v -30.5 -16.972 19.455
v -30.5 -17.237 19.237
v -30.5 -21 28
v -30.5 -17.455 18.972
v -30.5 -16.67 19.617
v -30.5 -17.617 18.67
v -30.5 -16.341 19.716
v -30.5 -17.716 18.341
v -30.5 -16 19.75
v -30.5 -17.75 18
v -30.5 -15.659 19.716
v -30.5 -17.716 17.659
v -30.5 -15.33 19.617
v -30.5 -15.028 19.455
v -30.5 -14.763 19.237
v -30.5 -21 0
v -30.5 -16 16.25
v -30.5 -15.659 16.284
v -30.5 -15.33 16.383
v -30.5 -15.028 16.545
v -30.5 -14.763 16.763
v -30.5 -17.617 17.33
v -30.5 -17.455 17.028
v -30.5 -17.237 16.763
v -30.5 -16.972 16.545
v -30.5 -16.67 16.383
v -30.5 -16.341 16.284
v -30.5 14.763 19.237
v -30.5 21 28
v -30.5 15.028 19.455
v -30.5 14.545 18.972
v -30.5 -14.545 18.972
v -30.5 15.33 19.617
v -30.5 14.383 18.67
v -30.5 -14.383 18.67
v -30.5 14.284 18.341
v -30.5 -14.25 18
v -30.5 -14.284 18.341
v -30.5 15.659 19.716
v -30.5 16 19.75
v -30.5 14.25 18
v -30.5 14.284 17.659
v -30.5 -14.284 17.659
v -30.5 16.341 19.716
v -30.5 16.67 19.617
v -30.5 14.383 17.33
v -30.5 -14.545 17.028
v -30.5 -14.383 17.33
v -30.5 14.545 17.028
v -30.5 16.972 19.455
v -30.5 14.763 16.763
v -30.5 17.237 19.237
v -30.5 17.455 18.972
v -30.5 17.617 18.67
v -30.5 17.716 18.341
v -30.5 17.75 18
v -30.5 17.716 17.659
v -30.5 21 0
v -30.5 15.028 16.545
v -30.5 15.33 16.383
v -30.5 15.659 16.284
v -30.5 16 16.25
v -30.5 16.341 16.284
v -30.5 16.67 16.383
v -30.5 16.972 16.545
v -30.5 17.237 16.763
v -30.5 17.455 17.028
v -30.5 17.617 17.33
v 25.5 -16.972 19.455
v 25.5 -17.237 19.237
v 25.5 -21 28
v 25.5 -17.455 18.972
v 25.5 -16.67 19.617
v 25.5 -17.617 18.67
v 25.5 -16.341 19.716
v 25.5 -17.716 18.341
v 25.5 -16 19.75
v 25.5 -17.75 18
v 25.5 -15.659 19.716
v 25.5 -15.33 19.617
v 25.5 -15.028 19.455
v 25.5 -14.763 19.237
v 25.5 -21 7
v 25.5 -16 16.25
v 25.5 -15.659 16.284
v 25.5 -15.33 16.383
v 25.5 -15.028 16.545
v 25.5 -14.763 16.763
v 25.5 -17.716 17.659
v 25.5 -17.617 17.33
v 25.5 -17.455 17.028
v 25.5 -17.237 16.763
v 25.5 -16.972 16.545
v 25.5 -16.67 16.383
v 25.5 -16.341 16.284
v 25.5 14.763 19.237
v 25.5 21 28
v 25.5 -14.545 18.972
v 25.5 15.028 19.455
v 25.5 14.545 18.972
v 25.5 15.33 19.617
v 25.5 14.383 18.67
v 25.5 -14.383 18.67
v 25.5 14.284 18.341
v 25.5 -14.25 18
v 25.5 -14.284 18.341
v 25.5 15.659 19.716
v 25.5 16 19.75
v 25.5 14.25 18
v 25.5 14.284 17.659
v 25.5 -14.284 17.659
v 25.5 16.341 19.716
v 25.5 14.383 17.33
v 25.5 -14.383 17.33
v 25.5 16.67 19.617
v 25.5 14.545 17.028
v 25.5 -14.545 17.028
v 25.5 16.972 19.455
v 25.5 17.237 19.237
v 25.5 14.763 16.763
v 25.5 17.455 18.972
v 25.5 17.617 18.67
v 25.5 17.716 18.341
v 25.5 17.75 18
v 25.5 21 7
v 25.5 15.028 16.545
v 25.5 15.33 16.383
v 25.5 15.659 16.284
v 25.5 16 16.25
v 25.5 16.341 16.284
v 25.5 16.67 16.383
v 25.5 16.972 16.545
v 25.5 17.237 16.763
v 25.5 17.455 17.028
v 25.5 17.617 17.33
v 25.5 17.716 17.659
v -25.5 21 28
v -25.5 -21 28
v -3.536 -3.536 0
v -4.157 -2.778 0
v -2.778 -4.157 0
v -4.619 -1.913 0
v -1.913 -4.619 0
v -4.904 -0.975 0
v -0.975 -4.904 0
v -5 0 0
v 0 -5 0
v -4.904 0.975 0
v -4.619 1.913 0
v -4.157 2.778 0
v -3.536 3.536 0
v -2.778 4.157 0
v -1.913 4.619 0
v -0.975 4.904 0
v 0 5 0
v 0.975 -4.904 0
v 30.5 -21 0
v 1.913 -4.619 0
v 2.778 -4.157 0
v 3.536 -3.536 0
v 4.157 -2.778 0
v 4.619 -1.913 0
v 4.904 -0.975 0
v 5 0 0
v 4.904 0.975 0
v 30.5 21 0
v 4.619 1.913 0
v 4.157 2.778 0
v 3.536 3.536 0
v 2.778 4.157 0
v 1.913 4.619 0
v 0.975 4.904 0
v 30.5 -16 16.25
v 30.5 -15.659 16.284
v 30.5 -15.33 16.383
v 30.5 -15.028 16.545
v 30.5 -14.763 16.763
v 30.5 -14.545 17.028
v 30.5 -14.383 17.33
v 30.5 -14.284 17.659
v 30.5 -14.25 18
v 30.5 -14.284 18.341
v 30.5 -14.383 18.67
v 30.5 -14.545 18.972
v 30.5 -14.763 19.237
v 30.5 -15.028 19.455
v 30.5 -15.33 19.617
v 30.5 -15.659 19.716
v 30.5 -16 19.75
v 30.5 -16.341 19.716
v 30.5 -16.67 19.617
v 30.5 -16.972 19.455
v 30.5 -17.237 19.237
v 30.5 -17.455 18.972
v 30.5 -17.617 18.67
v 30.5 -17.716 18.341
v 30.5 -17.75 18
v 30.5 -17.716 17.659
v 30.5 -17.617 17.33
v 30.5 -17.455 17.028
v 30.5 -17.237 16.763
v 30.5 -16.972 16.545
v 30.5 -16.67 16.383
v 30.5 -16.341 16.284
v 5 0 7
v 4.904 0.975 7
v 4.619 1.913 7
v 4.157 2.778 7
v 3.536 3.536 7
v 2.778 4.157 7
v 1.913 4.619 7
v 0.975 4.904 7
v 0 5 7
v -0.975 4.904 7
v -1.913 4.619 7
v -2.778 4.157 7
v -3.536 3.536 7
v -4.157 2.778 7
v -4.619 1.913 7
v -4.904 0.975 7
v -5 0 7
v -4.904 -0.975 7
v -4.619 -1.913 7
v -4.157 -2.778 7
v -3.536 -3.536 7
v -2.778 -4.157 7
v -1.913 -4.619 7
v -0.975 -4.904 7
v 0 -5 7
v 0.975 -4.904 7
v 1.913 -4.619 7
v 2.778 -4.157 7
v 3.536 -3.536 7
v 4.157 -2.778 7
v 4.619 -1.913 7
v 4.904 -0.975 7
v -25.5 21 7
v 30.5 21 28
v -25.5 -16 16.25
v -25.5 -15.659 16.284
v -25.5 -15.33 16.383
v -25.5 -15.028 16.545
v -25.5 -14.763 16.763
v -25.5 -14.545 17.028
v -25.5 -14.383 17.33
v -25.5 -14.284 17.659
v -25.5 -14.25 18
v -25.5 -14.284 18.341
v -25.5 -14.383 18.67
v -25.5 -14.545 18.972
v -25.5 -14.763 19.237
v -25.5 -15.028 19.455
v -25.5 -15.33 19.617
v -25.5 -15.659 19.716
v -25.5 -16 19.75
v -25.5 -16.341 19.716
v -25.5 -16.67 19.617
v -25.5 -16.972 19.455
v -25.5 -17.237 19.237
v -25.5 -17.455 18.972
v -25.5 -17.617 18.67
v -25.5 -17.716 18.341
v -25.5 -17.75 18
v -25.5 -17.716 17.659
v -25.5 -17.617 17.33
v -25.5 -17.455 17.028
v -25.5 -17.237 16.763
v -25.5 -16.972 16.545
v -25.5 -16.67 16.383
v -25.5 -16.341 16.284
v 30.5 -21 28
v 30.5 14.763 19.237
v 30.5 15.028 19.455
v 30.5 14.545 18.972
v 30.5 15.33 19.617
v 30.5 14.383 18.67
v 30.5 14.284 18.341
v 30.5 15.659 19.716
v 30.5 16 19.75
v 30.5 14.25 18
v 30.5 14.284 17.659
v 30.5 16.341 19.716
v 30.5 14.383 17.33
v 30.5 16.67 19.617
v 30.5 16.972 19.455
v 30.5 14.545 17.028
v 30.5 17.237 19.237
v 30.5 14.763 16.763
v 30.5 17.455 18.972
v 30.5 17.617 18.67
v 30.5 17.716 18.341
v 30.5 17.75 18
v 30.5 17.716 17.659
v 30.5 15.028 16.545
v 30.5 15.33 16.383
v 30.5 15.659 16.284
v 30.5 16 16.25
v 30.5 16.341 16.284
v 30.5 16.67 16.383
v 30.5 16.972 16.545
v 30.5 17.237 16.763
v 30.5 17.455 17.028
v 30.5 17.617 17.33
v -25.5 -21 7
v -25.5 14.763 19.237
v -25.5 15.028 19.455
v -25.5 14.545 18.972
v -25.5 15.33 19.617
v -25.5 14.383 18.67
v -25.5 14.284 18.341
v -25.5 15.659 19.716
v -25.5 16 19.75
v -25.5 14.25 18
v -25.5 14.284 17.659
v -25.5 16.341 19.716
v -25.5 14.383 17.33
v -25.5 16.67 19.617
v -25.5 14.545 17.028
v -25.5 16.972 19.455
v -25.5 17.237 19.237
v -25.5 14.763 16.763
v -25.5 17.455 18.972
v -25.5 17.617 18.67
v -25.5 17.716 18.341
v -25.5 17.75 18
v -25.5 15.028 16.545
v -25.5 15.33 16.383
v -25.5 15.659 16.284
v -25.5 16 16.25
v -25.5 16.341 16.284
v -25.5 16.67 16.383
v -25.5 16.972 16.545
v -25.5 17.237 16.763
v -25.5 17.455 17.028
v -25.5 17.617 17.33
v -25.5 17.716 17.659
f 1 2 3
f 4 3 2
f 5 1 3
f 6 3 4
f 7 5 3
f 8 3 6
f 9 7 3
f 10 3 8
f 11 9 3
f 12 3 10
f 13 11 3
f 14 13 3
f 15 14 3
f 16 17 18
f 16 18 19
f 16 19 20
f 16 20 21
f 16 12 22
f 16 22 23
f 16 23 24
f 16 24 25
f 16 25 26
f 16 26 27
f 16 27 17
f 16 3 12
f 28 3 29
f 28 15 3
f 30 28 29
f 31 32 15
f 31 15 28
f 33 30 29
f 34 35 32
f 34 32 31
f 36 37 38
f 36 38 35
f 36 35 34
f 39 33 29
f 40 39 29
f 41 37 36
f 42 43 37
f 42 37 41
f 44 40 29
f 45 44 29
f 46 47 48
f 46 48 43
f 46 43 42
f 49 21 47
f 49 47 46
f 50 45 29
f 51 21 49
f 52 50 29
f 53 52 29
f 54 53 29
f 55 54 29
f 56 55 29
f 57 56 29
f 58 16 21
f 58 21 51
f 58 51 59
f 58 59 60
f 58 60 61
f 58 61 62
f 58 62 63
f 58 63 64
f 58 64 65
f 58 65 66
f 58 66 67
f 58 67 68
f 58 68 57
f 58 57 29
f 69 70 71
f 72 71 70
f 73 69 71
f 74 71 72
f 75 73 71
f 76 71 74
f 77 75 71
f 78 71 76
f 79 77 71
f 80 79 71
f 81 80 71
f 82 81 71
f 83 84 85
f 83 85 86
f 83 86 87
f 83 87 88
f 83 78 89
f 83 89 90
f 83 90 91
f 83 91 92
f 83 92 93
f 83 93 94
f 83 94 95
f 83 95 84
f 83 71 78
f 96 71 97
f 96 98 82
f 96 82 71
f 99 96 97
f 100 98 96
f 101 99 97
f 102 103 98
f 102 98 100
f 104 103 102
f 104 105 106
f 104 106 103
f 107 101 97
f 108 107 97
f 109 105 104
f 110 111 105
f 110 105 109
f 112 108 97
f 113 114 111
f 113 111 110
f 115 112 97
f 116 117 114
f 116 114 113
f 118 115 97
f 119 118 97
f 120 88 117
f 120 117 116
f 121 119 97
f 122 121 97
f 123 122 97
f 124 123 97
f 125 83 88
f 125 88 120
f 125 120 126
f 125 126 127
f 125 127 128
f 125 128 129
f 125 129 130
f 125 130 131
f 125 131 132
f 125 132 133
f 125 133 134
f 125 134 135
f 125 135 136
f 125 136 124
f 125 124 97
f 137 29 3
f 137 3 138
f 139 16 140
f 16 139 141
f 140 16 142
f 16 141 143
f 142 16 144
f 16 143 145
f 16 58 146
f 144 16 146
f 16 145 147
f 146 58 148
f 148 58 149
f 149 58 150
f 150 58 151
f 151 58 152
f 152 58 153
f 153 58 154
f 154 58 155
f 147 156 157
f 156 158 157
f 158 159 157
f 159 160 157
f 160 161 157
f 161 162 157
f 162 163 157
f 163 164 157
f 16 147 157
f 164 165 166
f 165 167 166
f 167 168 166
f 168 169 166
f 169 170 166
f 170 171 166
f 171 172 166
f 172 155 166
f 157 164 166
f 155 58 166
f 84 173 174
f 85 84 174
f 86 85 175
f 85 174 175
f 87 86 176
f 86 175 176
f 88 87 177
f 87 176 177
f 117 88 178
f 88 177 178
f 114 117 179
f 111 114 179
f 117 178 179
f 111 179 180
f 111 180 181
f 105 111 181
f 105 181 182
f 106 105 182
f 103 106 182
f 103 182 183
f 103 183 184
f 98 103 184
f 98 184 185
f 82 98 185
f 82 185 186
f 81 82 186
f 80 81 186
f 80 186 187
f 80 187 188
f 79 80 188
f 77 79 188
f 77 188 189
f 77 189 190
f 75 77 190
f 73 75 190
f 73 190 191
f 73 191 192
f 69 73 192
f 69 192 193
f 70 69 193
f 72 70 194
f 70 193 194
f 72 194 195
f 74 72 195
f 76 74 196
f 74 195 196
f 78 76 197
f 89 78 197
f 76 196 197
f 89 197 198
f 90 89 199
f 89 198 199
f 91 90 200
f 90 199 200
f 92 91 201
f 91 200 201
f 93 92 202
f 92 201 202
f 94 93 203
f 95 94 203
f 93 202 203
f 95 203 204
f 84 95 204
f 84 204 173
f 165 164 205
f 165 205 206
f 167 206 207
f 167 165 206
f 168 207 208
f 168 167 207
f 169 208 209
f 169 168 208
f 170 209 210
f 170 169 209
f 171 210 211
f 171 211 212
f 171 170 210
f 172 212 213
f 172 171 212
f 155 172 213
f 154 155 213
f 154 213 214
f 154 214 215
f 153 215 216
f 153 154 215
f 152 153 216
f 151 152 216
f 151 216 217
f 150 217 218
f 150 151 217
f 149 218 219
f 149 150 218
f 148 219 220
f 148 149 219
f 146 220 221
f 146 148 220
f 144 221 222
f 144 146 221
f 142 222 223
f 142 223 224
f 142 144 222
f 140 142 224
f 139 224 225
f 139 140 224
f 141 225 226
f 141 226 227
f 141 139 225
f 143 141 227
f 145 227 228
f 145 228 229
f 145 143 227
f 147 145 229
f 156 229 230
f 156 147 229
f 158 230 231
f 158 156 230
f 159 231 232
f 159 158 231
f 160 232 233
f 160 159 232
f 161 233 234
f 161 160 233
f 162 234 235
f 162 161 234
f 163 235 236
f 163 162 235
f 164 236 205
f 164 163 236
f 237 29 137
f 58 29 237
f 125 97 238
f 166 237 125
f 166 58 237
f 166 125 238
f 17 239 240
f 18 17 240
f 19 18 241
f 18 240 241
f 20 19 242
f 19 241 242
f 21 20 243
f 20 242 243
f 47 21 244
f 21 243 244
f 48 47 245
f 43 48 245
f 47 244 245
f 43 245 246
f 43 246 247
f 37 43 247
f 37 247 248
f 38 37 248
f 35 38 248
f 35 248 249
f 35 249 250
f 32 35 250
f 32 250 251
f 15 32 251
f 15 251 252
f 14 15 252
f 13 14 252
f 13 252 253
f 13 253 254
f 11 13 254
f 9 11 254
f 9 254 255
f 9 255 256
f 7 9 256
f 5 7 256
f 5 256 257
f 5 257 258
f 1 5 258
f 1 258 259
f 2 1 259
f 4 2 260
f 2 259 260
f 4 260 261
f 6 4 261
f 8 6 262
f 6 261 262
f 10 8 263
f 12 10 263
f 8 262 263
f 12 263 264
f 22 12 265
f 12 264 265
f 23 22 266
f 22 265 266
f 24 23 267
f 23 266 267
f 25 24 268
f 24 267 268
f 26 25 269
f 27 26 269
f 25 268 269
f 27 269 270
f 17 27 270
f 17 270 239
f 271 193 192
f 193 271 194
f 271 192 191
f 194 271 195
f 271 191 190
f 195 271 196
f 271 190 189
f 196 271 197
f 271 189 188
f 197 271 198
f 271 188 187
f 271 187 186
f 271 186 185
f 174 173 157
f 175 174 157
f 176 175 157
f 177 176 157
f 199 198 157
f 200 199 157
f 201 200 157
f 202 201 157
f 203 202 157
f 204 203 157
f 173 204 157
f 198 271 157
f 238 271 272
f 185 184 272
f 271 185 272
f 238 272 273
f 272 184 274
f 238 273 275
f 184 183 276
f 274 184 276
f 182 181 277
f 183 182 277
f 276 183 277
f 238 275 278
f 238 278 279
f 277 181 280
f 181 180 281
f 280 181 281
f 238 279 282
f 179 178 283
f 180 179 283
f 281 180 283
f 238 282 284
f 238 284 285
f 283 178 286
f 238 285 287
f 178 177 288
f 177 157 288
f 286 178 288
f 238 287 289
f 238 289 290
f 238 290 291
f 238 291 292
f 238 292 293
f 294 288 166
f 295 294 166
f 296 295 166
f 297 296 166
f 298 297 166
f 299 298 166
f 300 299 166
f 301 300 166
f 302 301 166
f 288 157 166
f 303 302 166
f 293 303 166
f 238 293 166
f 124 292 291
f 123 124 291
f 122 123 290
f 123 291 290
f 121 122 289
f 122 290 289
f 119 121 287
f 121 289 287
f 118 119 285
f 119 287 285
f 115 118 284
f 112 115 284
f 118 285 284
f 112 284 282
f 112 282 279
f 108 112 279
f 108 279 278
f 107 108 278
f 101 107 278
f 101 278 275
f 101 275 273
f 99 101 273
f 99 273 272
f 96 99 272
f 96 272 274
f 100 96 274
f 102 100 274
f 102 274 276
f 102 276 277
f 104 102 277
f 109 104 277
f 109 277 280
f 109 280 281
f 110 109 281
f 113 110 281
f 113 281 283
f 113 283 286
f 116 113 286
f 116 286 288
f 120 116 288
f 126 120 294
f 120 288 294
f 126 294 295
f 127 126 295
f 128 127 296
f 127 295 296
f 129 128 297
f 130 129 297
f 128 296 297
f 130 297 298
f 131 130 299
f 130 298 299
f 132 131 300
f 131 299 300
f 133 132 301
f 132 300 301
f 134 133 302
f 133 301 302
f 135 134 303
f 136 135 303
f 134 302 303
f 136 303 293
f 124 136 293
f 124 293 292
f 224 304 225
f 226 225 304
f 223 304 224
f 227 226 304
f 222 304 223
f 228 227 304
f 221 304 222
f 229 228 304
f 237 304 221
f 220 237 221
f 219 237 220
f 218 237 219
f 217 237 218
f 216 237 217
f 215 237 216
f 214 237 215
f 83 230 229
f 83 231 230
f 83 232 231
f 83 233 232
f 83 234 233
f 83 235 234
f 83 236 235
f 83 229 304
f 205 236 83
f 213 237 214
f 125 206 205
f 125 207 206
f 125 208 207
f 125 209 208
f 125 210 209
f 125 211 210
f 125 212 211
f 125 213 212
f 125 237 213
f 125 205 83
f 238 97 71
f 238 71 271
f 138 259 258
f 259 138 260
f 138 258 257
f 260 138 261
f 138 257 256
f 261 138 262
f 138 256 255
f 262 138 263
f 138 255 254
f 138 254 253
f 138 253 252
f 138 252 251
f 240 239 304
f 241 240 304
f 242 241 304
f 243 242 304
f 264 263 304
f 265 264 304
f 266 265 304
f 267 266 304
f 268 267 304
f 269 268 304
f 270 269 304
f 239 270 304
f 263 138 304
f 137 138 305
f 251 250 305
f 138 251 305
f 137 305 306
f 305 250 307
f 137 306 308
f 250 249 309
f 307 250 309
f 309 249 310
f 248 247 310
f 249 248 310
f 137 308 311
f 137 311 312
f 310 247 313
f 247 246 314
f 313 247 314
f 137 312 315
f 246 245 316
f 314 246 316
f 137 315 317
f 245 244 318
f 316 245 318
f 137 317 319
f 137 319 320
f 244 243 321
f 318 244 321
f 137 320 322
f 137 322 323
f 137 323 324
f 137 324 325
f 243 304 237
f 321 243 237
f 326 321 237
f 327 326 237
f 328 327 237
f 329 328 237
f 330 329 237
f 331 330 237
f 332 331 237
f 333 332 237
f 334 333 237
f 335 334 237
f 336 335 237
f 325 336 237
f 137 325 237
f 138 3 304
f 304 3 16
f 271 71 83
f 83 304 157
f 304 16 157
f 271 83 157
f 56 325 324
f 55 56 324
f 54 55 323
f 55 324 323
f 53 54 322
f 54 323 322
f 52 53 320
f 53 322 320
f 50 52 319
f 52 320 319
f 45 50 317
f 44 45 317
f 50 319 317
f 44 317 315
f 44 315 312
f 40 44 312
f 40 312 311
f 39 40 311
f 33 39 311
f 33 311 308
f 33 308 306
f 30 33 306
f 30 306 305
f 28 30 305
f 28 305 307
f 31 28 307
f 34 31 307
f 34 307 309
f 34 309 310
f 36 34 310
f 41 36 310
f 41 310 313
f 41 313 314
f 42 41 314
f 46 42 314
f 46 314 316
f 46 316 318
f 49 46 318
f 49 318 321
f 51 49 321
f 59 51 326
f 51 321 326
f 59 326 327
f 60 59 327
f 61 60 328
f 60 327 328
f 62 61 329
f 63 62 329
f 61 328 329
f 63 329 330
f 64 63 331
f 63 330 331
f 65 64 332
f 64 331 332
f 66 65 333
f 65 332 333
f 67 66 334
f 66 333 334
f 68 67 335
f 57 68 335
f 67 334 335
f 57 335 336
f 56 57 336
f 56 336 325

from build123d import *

# Parameters (mm, degrees)
SKETCH1_W           = 61
SKETCH1_H           = 42
SKETCH1_R           = 5
BOSS_EXTRUDE1_DEPTH = 7
SKETCH2_W           = 5
SKETCH2_H           = 42
BOSS_EXTRUDE2_DEPTH = 21
SKETCH3_R           = 1.75
CUT_EXTRUDE1_DEPTH  = 71.32780389


with BuildPart() as part:
    # Sketch1 → Boss-Extrude1 (new body)
    with BuildSketch(Plane.XY):
        Rectangle(SKETCH1_W, SKETCH1_H)
        Circle(SKETCH1_R, mode=Mode.SUBTRACT)
    extrude(amount=BOSS_EXTRUDE1_DEPTH)

    # Sketch2 → Boss-Extrude2 (add)
    with BuildSketch(Plane.XY.offset(7)):
        with Locations((-28, 0)):
            Rectangle(SKETCH2_W, SKETCH2_H)
        with Locations((28, 0)):
            Rectangle(SKETCH2_W, SKETCH2_H)
    extrude(amount=BOSS_EXTRUDE2_DEPTH)

    # Sketch3 → Cut-Extrude1 (cut, through all)
    with BuildSketch(Plane(origin=(30.5, 0, 0), x_dir=(0, 0, -1), z_dir=(1, 0, 0))):
        with Locations(Location((-18, 16, 0), (0, 0, 90))):
            Circle(SKETCH3_R)
        with Locations((-18, -16)):
            Circle(SKETCH3_R)
    extrude(amount=-CUT_EXTRUDE1_DEPTH, mode=Mode.SUBTRACT)


solid = part.part
